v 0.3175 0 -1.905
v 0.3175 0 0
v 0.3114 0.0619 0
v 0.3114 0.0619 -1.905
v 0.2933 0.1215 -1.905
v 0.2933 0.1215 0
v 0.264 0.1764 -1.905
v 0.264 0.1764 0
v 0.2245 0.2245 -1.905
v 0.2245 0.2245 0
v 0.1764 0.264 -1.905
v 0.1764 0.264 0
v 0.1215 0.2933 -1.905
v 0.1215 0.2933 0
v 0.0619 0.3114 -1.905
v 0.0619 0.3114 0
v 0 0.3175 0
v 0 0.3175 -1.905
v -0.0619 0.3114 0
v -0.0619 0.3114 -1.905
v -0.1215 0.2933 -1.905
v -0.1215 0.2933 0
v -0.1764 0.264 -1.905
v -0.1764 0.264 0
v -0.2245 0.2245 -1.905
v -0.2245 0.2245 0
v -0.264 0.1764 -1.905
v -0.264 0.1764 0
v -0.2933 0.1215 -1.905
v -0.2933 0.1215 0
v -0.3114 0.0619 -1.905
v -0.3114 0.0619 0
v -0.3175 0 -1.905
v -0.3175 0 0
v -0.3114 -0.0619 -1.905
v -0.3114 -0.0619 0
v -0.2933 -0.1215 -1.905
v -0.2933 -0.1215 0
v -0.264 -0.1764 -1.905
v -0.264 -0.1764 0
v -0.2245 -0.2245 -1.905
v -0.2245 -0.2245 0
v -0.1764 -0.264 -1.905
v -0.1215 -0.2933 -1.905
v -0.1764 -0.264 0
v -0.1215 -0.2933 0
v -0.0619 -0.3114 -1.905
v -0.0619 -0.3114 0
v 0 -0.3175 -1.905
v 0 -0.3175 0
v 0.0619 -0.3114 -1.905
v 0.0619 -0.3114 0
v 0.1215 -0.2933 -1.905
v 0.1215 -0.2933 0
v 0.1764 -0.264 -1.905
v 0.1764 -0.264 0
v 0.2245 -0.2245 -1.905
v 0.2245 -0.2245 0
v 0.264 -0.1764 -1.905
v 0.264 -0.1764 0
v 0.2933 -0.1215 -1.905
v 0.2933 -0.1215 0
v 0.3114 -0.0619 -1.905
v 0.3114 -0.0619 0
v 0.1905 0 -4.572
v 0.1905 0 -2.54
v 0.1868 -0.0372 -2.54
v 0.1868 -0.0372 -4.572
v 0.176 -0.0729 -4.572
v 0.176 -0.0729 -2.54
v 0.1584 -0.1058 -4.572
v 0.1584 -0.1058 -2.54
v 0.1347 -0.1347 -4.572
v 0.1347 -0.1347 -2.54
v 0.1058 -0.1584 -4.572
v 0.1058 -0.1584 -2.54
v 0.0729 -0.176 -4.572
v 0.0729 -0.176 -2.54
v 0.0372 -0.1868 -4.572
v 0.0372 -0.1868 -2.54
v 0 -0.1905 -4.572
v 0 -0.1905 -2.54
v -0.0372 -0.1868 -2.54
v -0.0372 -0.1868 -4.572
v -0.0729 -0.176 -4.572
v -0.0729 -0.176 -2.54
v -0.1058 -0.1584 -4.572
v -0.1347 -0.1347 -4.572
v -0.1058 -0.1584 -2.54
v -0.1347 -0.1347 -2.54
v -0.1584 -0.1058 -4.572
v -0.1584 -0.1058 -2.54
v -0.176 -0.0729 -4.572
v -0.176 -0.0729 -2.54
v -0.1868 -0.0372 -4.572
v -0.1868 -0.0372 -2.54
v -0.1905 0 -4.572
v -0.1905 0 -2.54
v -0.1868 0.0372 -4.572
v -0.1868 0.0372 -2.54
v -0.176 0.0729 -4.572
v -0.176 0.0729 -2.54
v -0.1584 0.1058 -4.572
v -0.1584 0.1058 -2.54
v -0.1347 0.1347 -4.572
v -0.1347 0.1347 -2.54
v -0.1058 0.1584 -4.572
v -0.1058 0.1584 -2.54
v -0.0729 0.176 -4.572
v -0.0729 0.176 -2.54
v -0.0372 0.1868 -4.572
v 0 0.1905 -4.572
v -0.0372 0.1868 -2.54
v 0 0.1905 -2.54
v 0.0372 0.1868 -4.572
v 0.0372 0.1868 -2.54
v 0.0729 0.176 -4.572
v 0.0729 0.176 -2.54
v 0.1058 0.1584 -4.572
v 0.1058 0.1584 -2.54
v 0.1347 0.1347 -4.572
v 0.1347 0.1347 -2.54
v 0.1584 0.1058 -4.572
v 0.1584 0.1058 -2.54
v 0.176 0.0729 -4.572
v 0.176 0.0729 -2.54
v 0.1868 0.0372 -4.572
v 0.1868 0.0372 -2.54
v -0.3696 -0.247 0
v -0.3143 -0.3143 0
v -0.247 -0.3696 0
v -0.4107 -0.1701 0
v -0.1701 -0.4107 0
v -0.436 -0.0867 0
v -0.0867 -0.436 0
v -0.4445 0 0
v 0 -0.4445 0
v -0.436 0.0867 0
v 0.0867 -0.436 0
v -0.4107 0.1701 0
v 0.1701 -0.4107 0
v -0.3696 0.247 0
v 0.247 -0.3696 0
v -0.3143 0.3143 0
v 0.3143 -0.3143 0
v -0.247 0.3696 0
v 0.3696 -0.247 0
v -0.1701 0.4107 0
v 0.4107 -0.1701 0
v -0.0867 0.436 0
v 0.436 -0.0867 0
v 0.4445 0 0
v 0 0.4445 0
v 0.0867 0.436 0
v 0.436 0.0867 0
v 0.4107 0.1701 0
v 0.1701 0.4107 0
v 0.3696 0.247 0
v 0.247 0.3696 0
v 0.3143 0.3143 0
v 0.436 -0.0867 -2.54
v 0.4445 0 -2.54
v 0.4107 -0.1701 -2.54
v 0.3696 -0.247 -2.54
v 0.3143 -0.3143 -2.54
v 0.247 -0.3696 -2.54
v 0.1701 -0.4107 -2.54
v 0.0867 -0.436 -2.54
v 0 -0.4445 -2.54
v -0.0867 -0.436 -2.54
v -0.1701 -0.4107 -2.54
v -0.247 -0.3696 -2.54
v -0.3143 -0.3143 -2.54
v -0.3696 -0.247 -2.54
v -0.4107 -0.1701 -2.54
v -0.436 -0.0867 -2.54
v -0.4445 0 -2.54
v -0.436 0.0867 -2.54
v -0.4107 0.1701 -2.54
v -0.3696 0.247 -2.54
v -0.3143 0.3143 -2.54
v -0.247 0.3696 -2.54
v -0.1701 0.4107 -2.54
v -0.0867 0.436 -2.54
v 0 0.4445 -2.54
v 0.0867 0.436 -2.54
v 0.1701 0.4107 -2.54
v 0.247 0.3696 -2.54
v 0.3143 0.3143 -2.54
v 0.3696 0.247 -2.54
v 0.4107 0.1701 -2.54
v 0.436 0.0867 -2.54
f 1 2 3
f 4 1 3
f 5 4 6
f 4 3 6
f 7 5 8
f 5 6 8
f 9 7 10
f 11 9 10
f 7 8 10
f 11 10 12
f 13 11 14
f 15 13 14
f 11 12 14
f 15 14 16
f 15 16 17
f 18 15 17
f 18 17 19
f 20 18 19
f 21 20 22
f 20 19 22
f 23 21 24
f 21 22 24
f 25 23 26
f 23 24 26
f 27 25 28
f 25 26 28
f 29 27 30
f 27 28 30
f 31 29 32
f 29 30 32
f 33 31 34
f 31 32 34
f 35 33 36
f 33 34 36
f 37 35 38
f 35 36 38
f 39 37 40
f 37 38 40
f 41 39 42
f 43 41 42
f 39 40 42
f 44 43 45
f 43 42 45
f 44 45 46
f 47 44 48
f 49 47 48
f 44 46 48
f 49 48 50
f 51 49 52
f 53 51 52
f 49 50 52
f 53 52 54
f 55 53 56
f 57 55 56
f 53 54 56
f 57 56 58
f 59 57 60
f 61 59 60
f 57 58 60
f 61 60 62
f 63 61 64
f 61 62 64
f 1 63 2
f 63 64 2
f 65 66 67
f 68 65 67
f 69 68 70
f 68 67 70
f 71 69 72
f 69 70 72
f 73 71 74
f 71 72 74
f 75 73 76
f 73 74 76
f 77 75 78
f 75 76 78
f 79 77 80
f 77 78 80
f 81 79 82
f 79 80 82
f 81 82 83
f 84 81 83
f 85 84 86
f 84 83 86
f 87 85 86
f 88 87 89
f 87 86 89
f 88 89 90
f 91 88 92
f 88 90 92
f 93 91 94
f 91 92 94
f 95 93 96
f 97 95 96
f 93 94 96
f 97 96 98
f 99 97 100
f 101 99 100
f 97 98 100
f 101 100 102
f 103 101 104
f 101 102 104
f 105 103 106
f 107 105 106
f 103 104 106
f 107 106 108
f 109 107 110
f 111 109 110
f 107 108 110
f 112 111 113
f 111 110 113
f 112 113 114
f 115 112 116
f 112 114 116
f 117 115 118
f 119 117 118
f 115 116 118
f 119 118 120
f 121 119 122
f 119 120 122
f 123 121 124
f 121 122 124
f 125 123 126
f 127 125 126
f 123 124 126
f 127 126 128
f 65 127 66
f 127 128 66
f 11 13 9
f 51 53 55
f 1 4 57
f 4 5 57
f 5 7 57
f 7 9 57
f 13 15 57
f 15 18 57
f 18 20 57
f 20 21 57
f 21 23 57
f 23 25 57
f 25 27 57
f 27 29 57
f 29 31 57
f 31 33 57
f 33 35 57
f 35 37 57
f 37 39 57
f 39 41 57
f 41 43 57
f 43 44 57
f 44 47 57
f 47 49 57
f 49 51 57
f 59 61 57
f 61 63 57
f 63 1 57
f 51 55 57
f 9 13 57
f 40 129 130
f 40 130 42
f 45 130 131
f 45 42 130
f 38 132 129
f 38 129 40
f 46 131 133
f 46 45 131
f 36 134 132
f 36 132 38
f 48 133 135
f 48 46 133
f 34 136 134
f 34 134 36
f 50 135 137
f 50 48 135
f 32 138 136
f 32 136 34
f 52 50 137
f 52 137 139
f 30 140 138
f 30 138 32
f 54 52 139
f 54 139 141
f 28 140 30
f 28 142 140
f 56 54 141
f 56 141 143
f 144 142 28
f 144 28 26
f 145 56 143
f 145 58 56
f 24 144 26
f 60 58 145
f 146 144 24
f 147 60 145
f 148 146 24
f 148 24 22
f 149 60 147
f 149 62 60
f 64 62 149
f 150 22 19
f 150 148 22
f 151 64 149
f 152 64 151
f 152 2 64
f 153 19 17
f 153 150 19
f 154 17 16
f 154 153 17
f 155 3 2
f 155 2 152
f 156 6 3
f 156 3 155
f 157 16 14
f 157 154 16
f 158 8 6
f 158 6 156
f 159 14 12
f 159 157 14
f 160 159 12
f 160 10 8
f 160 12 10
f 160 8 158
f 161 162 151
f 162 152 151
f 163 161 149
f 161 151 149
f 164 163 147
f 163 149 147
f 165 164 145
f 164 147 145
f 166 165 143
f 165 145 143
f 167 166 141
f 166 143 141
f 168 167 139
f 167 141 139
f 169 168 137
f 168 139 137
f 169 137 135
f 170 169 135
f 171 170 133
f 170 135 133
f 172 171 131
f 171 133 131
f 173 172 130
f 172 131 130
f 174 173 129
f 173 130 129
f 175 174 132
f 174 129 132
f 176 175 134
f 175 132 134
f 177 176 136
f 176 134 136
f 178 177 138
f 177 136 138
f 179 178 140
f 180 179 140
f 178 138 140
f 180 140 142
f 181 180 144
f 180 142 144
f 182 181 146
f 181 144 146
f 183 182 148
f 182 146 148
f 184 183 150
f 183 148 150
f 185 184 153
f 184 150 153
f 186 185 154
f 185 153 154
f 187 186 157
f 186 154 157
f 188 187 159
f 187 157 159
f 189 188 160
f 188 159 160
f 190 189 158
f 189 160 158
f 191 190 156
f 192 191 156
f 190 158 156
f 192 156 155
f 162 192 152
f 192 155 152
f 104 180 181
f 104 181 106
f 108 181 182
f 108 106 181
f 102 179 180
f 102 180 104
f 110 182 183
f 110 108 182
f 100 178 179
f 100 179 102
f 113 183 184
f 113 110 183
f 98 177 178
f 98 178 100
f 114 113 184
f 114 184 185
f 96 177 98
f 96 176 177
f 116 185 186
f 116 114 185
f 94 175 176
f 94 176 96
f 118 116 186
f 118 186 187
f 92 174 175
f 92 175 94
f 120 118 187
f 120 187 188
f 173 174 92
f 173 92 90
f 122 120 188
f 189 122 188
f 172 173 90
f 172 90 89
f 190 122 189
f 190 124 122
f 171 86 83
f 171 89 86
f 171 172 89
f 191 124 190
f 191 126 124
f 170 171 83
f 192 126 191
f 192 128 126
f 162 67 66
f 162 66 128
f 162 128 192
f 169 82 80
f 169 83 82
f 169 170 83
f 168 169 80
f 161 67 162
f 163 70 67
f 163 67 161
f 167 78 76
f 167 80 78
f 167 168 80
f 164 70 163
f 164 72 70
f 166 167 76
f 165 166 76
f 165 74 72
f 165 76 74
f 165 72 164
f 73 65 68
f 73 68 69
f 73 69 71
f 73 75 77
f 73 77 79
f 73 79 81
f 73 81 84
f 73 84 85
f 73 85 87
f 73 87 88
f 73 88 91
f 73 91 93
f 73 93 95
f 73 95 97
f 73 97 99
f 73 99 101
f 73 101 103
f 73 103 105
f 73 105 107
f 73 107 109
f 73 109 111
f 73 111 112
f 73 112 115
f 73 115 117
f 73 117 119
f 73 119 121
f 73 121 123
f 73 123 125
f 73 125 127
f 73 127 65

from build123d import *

# Parameters (mm, degrees)
F0_R     = 0.4445
F0_R_2   = 0.3175
F1_DEPTH = 1.905
F2_R     = 0.4445
F3_DEPTH = 0.635
F4_R     = 0.1905
F5_DEPTH = 2.032


with BuildPart() as f1:
    # F0 (on Top) → F1 (new body)
    with BuildSketch(Plane.XY):
        Circle(F0_R)
        Circle(F0_R_2, mode=Mode.SUBTRACT)
    extrude(amount=-F1_DEPTH)

    # F2 (on face) → F3 (join)
    with BuildSketch(Plane(origin=(0, 0, -1.905), x_dir=(1, 0, 0), z_dir=(0, 0, -1))):
        Circle(F2_R)
    extrude(amount=F3_DEPTH)

    # F4 (on face) → F5 (join)
    with BuildSketch(Plane(origin=(0, 0, -2.54), x_dir=(1, 0, 0), z_dir=(0, 0, -1))):
        Circle(F4_R)
    extrude(amount=F5_DEPTH)


solid = f1.part
